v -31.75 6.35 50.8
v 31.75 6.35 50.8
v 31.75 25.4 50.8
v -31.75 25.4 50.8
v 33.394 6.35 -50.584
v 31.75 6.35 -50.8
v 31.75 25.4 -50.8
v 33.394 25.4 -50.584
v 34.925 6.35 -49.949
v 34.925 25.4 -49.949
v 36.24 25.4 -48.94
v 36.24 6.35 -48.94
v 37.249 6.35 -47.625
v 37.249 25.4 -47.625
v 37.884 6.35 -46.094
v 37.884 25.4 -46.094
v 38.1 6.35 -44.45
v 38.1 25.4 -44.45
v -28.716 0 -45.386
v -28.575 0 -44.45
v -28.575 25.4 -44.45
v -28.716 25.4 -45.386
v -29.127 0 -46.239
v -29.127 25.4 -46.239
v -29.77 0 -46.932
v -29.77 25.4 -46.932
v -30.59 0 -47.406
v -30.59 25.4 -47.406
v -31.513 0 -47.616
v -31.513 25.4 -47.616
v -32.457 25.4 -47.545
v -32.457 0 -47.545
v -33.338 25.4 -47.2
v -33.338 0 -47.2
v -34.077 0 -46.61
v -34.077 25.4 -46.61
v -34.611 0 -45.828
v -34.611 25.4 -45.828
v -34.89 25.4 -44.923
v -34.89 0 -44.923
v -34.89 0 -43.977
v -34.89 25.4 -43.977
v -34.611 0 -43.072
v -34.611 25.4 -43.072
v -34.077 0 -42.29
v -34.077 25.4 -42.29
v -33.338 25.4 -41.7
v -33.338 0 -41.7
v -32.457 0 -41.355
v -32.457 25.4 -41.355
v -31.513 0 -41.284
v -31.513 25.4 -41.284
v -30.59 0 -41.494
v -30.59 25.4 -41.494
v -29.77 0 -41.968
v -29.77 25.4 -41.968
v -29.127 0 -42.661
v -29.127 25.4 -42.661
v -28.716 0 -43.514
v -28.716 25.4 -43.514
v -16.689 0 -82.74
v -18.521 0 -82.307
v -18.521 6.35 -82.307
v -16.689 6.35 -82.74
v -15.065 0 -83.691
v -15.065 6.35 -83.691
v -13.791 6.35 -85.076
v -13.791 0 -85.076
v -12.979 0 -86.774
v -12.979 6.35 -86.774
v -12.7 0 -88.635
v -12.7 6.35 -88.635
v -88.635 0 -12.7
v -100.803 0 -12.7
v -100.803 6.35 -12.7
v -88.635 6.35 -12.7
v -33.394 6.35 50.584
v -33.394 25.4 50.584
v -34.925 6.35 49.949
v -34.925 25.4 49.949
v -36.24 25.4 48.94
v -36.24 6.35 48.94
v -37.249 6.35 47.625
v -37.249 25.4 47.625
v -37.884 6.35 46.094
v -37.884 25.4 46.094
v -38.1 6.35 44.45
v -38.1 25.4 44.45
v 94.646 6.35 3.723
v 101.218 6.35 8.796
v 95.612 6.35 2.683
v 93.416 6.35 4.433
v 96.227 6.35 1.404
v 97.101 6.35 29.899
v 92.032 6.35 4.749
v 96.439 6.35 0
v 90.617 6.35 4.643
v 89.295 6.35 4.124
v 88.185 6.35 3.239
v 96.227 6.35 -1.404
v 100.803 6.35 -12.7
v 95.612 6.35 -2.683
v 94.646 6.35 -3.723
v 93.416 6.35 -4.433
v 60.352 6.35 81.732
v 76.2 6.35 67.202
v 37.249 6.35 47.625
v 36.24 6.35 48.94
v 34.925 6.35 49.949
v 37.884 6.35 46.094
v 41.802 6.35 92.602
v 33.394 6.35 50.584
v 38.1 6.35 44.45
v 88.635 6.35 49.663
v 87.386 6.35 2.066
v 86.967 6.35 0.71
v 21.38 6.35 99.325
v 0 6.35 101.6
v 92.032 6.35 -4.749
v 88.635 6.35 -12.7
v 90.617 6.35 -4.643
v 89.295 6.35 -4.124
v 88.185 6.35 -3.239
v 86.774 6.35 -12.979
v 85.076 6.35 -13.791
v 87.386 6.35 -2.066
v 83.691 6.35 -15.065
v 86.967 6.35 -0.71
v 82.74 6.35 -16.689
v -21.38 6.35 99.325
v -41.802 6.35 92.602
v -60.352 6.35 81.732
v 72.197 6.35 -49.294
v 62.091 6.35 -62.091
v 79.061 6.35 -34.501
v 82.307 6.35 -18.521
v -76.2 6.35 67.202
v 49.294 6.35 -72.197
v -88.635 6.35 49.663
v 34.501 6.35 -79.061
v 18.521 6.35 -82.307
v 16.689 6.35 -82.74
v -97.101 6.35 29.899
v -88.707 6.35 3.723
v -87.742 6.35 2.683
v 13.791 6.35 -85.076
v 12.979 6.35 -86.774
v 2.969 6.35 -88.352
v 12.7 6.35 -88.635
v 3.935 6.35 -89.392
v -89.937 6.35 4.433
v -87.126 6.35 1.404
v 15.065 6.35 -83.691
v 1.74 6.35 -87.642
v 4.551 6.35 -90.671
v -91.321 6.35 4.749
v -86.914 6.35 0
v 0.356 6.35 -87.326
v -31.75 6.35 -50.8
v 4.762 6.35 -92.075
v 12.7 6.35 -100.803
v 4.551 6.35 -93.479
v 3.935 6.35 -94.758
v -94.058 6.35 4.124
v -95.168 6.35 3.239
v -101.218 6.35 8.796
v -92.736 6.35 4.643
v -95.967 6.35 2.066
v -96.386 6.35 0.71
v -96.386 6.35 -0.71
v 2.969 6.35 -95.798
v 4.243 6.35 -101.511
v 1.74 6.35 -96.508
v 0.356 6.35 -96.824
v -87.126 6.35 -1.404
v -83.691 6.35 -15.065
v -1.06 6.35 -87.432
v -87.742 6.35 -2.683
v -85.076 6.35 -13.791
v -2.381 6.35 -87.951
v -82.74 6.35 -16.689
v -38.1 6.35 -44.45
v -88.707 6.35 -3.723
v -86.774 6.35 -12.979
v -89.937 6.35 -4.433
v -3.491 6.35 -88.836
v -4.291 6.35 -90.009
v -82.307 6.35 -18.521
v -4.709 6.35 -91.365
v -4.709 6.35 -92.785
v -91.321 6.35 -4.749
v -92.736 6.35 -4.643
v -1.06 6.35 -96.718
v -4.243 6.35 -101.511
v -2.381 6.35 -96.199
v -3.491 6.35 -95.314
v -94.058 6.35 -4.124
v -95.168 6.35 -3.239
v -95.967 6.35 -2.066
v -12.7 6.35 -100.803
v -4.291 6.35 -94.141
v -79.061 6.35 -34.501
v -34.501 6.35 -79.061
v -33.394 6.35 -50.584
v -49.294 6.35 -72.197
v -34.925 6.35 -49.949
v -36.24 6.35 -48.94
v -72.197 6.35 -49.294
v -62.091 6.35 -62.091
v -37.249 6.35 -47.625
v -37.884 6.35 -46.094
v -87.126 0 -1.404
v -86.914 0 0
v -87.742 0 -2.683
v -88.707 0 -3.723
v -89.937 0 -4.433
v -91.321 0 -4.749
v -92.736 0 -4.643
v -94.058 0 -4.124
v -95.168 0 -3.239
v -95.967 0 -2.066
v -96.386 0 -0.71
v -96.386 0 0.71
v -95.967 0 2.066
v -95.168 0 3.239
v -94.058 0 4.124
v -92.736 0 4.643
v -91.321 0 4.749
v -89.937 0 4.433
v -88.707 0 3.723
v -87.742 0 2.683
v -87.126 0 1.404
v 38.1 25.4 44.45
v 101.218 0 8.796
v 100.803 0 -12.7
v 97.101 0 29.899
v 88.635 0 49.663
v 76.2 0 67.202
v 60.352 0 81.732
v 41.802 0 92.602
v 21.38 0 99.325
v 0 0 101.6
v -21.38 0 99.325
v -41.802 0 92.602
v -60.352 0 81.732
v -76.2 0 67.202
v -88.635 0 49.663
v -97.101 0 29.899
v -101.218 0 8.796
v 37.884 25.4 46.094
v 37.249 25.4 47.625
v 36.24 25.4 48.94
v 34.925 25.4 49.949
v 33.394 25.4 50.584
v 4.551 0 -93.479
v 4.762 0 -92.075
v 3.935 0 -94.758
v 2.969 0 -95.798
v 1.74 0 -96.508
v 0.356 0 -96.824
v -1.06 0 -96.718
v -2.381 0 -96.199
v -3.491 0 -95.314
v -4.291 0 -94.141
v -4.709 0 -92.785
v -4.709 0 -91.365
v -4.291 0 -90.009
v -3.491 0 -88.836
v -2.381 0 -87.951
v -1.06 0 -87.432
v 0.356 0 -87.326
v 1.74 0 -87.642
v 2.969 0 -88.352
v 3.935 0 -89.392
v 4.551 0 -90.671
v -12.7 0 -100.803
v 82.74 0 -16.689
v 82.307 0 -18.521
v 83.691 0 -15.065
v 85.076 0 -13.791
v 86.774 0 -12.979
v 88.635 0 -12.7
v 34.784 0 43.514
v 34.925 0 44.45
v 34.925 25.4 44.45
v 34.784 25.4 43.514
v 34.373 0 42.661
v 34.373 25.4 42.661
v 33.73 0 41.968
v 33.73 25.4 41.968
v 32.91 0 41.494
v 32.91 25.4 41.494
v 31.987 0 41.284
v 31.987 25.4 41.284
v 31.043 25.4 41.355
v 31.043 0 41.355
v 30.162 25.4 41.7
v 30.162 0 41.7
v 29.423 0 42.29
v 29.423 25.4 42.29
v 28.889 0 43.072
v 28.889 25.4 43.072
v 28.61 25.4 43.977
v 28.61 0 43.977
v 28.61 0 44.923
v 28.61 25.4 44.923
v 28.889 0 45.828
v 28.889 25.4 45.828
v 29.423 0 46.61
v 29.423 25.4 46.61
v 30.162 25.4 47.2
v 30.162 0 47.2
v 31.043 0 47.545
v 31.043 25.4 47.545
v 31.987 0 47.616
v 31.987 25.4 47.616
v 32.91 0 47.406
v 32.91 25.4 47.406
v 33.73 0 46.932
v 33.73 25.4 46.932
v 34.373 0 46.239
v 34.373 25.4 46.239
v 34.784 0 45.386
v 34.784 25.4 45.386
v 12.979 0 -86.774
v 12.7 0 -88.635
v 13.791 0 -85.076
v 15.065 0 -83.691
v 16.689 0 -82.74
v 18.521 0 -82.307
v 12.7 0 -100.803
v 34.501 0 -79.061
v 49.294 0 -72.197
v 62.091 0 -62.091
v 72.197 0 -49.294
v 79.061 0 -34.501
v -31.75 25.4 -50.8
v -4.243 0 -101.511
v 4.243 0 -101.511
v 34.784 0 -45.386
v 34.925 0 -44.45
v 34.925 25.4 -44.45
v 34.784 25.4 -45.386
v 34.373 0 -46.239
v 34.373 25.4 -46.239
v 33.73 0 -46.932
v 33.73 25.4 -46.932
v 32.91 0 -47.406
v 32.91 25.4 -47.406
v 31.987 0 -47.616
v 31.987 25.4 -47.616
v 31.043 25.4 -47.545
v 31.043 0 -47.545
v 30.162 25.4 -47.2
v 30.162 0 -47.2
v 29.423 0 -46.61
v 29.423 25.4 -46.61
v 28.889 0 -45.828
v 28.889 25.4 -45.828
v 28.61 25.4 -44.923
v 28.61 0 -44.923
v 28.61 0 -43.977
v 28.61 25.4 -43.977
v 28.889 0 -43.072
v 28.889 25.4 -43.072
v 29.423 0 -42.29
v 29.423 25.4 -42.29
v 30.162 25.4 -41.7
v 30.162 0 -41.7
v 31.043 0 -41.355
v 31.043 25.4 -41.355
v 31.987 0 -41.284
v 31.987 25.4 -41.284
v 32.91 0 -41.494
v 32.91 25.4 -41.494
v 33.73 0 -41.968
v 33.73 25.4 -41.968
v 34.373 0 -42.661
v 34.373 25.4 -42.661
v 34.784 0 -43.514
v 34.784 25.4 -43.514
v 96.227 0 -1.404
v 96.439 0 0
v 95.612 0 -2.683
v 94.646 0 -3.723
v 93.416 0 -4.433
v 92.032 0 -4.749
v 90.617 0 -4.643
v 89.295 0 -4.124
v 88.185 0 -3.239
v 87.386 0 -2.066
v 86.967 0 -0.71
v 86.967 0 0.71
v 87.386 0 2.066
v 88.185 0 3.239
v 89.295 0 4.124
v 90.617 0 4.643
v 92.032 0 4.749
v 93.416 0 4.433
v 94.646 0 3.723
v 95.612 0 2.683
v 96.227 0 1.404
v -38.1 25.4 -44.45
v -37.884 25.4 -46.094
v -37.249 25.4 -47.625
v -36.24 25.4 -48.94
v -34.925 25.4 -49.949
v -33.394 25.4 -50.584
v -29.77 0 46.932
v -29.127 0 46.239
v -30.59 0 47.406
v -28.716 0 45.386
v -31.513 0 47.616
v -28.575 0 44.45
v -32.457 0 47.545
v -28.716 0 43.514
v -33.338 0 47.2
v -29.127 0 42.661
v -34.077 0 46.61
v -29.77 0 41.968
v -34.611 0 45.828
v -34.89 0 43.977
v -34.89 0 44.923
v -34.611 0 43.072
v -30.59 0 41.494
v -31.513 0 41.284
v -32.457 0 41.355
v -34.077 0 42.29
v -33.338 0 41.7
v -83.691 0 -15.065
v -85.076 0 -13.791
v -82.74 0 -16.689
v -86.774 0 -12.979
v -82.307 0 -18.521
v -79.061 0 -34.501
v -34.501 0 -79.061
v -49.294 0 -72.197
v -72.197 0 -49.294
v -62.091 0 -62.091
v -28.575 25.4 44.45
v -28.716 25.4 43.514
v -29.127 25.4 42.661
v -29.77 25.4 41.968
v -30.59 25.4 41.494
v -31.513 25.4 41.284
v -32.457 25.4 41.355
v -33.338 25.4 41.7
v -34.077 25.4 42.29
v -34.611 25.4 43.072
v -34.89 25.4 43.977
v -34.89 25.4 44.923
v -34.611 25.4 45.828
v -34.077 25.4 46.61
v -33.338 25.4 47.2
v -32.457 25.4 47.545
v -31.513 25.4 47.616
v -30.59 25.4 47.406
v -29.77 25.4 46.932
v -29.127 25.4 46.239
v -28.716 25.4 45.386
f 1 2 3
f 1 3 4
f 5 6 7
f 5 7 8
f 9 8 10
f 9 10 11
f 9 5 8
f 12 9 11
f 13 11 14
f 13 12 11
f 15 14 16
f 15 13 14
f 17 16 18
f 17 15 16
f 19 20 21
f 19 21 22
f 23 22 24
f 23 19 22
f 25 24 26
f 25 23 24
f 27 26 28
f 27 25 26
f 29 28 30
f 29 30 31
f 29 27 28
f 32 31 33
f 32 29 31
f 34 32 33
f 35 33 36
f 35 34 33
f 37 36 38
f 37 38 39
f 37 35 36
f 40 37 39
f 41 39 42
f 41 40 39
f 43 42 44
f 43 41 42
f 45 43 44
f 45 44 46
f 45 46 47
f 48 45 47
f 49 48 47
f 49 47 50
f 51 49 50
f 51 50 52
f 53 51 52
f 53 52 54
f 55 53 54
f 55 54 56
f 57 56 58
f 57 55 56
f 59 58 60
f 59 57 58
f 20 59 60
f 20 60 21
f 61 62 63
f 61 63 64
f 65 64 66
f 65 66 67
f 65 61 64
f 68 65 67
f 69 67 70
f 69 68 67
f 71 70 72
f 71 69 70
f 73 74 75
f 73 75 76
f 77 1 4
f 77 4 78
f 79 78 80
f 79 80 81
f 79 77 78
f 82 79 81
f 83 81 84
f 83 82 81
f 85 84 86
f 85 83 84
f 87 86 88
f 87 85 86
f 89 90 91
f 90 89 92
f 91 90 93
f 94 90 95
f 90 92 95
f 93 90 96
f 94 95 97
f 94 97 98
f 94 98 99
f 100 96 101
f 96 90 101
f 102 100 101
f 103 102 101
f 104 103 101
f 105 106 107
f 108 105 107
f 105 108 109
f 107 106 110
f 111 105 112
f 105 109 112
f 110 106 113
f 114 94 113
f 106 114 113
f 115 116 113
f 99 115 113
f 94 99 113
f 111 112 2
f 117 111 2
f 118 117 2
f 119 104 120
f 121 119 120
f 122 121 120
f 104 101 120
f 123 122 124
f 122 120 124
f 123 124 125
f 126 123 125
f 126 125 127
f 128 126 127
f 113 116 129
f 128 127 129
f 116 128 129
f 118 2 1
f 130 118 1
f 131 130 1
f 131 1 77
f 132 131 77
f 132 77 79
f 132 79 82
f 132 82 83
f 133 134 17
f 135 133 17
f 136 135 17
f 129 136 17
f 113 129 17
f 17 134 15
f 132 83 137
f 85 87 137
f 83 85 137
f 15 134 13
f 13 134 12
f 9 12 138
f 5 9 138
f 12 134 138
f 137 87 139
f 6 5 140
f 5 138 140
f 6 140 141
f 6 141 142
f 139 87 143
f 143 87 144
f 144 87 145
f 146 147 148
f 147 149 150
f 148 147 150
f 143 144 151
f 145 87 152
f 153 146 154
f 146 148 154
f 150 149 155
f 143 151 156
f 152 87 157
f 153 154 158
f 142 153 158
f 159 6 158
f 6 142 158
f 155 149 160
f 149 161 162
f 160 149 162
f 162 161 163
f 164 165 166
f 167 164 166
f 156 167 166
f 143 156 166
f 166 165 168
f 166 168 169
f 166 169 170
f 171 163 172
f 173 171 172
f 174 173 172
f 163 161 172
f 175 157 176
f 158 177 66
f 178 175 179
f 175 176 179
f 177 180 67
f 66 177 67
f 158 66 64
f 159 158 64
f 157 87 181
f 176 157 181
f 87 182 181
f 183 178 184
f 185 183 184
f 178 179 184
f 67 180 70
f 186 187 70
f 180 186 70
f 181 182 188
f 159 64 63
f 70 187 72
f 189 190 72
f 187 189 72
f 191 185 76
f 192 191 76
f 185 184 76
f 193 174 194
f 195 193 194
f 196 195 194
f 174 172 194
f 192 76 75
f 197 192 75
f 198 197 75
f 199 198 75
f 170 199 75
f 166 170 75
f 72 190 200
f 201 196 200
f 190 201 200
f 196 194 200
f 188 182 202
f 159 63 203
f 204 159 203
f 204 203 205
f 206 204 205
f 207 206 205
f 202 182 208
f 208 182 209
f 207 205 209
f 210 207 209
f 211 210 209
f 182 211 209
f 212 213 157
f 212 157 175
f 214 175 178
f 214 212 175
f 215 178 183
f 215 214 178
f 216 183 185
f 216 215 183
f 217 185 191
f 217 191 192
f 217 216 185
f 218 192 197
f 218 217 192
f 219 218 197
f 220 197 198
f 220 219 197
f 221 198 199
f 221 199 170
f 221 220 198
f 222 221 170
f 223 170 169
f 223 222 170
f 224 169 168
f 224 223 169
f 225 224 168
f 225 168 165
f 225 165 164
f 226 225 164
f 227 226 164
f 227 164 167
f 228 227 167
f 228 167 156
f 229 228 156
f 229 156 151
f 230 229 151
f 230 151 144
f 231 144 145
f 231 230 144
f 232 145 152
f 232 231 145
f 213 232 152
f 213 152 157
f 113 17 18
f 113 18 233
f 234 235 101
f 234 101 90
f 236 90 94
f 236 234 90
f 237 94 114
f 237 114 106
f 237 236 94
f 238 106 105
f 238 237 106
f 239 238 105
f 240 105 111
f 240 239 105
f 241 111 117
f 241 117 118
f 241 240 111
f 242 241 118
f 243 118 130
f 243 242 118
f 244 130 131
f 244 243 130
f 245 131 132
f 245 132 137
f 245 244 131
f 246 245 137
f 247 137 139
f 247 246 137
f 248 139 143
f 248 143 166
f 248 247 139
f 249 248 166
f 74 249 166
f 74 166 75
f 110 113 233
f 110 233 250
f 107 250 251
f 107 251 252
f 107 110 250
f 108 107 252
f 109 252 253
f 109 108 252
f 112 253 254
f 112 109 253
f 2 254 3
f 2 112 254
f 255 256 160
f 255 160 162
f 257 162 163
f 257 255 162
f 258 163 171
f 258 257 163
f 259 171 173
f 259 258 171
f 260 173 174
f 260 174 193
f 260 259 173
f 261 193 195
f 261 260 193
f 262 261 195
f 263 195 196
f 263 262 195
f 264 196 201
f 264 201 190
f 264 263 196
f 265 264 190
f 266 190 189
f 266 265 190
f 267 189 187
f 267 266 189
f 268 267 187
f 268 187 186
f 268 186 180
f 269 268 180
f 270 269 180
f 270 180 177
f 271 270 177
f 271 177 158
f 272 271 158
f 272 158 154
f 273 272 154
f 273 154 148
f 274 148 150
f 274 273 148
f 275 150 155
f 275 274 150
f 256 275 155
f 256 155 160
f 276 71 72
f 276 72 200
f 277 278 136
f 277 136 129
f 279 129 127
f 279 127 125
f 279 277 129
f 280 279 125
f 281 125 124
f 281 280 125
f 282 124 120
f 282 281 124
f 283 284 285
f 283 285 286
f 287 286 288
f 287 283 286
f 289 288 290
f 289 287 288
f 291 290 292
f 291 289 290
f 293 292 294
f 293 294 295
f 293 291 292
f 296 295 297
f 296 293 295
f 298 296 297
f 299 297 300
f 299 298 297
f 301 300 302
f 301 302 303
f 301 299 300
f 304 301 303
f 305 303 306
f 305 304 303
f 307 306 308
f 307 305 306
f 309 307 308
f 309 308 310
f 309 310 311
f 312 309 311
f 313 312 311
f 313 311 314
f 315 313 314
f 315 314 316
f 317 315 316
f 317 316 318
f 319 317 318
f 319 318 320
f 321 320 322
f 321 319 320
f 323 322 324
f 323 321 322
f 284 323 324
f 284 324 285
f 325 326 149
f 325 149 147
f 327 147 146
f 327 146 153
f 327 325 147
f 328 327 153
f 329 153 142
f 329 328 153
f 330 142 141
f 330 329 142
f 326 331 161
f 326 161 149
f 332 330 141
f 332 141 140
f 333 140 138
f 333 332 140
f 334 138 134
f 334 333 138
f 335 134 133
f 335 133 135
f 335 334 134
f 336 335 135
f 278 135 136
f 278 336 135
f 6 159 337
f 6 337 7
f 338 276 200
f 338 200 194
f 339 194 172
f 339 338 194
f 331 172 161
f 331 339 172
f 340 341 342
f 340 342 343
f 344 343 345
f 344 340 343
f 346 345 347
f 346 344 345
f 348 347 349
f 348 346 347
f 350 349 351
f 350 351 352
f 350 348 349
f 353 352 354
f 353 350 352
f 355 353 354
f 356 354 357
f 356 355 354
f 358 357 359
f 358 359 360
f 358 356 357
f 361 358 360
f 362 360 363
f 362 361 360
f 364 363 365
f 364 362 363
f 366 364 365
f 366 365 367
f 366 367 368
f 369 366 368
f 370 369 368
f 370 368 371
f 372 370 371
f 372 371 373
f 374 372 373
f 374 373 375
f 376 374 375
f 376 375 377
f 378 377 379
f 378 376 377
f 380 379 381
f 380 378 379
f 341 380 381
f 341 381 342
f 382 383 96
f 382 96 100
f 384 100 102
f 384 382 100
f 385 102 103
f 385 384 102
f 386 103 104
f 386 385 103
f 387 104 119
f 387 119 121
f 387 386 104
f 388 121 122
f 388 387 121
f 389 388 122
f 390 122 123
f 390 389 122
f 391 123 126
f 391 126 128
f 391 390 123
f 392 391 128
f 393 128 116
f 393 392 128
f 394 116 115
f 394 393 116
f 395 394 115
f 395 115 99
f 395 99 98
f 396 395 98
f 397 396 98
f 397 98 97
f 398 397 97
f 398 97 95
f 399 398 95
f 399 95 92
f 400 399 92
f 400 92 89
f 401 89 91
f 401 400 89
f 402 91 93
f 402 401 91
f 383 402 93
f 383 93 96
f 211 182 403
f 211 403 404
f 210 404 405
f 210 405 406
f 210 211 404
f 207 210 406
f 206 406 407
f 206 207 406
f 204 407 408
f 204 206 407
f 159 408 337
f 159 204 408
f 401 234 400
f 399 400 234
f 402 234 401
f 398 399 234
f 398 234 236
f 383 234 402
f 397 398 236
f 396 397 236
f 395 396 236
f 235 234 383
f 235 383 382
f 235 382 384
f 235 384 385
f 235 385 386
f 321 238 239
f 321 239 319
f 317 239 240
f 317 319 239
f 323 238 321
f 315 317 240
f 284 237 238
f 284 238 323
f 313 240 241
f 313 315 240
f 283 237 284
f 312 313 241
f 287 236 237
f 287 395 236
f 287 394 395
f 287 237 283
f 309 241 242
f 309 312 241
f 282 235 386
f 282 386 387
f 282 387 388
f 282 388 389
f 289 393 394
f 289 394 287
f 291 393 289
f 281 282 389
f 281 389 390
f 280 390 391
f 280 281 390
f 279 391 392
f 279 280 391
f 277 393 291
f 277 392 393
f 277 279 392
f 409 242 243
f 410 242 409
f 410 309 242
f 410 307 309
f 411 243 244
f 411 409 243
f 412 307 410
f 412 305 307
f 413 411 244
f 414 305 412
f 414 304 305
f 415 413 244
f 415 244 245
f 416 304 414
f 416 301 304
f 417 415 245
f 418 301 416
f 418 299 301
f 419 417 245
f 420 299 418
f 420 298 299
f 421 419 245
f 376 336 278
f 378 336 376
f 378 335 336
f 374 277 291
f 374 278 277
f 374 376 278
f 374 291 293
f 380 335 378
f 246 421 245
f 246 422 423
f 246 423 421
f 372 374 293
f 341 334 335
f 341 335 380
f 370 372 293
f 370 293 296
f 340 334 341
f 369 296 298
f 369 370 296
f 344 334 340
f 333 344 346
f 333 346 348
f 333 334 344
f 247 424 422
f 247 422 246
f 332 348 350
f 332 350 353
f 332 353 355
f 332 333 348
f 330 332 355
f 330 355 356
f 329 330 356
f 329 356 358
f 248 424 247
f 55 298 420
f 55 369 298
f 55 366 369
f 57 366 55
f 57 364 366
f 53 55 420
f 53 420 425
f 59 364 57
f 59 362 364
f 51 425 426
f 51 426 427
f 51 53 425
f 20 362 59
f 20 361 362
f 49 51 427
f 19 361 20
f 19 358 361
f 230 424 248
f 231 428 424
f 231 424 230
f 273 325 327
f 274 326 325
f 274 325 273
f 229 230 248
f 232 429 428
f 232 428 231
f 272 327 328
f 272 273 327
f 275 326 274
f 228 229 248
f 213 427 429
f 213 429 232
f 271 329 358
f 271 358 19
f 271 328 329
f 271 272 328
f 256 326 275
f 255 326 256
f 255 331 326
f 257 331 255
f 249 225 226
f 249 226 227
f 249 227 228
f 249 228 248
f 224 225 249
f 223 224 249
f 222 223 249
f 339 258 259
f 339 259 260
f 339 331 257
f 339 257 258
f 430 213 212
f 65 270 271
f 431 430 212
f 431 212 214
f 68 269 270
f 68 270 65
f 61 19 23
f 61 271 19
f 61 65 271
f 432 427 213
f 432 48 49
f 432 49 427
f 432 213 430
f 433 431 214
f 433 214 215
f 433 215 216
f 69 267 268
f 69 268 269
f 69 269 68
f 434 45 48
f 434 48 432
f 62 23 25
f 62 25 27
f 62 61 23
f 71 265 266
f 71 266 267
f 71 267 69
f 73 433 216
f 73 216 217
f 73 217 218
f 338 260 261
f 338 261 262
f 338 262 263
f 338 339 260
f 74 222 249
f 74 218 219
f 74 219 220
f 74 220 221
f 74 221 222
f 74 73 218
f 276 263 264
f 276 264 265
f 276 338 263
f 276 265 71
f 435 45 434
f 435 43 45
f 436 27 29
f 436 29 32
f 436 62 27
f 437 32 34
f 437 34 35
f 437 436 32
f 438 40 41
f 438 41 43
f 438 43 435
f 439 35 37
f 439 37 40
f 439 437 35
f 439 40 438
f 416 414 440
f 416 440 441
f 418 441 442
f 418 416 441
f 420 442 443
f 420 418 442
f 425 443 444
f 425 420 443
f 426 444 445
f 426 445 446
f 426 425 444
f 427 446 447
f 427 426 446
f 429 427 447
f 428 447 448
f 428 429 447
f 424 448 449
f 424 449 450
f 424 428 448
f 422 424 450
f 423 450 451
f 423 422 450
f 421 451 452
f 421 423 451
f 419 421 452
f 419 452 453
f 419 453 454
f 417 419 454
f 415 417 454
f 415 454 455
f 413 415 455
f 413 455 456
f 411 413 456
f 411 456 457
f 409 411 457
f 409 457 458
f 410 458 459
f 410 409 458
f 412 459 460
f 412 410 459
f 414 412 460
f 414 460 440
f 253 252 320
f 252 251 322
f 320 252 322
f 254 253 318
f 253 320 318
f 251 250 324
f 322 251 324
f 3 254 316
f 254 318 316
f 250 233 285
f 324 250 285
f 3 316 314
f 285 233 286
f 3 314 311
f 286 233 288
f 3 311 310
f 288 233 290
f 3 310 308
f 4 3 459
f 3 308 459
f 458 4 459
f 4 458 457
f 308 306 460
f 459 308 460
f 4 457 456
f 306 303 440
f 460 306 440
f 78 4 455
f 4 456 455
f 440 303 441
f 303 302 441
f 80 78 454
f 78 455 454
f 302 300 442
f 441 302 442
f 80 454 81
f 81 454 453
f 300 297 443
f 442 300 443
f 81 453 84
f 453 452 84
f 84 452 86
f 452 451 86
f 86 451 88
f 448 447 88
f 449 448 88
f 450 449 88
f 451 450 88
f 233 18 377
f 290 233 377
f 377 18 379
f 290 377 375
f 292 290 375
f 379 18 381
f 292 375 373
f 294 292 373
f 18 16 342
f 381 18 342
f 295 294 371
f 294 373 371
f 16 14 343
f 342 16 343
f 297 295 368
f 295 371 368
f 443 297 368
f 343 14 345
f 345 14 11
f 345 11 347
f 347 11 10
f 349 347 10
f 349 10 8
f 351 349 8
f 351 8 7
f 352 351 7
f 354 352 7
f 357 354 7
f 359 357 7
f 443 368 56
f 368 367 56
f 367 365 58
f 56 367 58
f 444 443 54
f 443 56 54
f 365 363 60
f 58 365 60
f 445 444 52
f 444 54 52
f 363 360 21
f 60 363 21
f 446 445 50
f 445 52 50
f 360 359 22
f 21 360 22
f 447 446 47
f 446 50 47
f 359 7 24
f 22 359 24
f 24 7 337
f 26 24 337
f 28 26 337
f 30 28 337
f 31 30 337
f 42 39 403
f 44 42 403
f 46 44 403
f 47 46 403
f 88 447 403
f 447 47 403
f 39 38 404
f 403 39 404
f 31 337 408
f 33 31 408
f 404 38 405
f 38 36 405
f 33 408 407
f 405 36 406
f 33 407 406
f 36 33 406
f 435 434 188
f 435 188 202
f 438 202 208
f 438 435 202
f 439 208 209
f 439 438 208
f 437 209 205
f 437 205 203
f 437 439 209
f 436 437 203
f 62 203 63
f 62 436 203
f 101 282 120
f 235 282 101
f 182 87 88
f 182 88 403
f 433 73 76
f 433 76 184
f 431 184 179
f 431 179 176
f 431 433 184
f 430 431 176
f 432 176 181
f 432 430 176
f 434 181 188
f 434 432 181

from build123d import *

# Parameters (mm, degrees)
SKETCH1_R           = 3.175
BOSS_EXTRUDE1_DEPTH = 25.4
SKETCH1_3_R         = 4.7625
BOSS_EXTRUDE2_DEPTH = 6.35


with BuildPart() as part:
    # Sketch1 → Boss-Extrude1 (new body)
    with BuildSketch(Plane(origin=(0, 0, 0), x_dir=(1, 0, 0), z_dir=(0, 1, 0))):
        with BuildLine():
            ThreePointArc((-38.1, -44.45), (-36.240128061, -48.940128061), (-31.75, -50.8))
            Line((-31.75, -50.8), (31.75, -50.8))
            ThreePointArc((31.75, -50.8), (36.240128061, -48.940128061), (38.1, -44.45))
            Line((38.1, -44.45), (38.1, 44.45))
            ThreePointArc((38.1, 44.45), (36.240128061, 48.940128061), (31.75, 50.8))
            Line((31.75, 50.8), (-31.75, 50.8))
            ThreePointArc((-31.75, 50.8), (-36.240128061, 48.940128061), (-38.1, 44.45))
            Line((-38.1, 44.45), (-38.1, -44.45))
        make_face()
        with Locations((-31.75, -44.45)):
            Circle(SKETCH1_R, mode=Mode.SUBTRACT)
        with Locations((31.75, -44.45)):
            Circle(SKETCH1_R, mode=Mode.SUBTRACT)
        with Locations((-31.75, 44.45)):
            Circle(SKETCH1_R, mode=Mode.SUBTRACT)
        with Locations((31.75, 44.45)):
            Circle(SKETCH1_R, mode=Mode.SUBTRACT)
    extrude(amount=BOSS_EXTRUDE1_DEPTH)

    # Sketch1<3> → Boss-Extrude2 (add)
    with BuildSketch(Plane(origin=(0, 0, 0), x_dir=(1, 0, 0), z_dir=(0, 1, 0))):
        with BuildLine():
            ThreePointArc((12.7, 100.803124952), (0, 101.6), (-12.7, 100.803124952))
            Line((-12.7, 100.803124952), (-12.7, 88.634955719))
            ThreePointArc((-12.7, 88.634955719), (-14.376526542, 84.335985396), (-18.520833333, 82.307042742))
            ThreePointArc((-18.520833333, 82.307042742), (-62.091408666, 62.091408666), (-82.307042742, 18.520833333))
            ThreePointArc((-82.307042742, 18.520833333), (-84.335985396, 14.376526542), (-88.634955719, 12.7))
            Line((-88.634955719, 12.7), (-100.803124952, 12.7))
            ThreePointArc((-100.803124952, 12.7), (0, -101.6), (100.803124952, 12.7))
            Line((100.803124952, 12.7), (88.634955719, 12.7))
            ThreePointArc((88.634955719, 12.7), (84.335985396, 14.376526542), (82.307042742, 18.520833333))
            ThreePointArc((82.307042742, 18.520833333), (62.091408666, 62.091408666), (18.520833333, 82.307042742))
            ThreePointArc((18.520833333, 82.307042742), (14.376526542, 84.335985396), (12.7, 88.634955719))
            Line((12.7, 88.634955719), (12.7, 100.803124952))
        make_face()
        with Locations((-91.676562476, 0)):
            Circle(SKETCH1_3_R, mode=Mode.SUBTRACT)
        with BuildLine():
            Line((31.75, -50.8), (-31.75, -50.8))
            ThreePointArc((-31.75, -50.8), (-36.240128061, -48.940128061), (-38.1, -44.45))
            Line((-38.1, -44.45), (-38.1, 44.45))
            ThreePointArc((-38.1, 44.45), (-36.240128061, 48.940128061), (-31.75, 50.8))
            Line((-31.75, 50.8), (31.75, 50.8))
            ThreePointArc((31.75, 50.8), (36.240128061, 48.940128061), (38.1, 44.45))
            Line((38.1, 44.45), (38.1, -44.45))
            ThreePointArc((38.1, -44.45), (36.240128061, -48.940128061), (31.75, -50.8))
        make_face(mode=Mode.SUBTRACT)
        with Locations((0, 92.075)):
            Circle(SKETCH1_3_R, mode=Mode.SUBTRACT)
        with Locations((91.676562476, 0)):
            Circle(SKETCH1_3_R, mode=Mode.SUBTRACT)
    extrude(amount=BOSS_EXTRUDE2_DEPTH)


solid = part.part
